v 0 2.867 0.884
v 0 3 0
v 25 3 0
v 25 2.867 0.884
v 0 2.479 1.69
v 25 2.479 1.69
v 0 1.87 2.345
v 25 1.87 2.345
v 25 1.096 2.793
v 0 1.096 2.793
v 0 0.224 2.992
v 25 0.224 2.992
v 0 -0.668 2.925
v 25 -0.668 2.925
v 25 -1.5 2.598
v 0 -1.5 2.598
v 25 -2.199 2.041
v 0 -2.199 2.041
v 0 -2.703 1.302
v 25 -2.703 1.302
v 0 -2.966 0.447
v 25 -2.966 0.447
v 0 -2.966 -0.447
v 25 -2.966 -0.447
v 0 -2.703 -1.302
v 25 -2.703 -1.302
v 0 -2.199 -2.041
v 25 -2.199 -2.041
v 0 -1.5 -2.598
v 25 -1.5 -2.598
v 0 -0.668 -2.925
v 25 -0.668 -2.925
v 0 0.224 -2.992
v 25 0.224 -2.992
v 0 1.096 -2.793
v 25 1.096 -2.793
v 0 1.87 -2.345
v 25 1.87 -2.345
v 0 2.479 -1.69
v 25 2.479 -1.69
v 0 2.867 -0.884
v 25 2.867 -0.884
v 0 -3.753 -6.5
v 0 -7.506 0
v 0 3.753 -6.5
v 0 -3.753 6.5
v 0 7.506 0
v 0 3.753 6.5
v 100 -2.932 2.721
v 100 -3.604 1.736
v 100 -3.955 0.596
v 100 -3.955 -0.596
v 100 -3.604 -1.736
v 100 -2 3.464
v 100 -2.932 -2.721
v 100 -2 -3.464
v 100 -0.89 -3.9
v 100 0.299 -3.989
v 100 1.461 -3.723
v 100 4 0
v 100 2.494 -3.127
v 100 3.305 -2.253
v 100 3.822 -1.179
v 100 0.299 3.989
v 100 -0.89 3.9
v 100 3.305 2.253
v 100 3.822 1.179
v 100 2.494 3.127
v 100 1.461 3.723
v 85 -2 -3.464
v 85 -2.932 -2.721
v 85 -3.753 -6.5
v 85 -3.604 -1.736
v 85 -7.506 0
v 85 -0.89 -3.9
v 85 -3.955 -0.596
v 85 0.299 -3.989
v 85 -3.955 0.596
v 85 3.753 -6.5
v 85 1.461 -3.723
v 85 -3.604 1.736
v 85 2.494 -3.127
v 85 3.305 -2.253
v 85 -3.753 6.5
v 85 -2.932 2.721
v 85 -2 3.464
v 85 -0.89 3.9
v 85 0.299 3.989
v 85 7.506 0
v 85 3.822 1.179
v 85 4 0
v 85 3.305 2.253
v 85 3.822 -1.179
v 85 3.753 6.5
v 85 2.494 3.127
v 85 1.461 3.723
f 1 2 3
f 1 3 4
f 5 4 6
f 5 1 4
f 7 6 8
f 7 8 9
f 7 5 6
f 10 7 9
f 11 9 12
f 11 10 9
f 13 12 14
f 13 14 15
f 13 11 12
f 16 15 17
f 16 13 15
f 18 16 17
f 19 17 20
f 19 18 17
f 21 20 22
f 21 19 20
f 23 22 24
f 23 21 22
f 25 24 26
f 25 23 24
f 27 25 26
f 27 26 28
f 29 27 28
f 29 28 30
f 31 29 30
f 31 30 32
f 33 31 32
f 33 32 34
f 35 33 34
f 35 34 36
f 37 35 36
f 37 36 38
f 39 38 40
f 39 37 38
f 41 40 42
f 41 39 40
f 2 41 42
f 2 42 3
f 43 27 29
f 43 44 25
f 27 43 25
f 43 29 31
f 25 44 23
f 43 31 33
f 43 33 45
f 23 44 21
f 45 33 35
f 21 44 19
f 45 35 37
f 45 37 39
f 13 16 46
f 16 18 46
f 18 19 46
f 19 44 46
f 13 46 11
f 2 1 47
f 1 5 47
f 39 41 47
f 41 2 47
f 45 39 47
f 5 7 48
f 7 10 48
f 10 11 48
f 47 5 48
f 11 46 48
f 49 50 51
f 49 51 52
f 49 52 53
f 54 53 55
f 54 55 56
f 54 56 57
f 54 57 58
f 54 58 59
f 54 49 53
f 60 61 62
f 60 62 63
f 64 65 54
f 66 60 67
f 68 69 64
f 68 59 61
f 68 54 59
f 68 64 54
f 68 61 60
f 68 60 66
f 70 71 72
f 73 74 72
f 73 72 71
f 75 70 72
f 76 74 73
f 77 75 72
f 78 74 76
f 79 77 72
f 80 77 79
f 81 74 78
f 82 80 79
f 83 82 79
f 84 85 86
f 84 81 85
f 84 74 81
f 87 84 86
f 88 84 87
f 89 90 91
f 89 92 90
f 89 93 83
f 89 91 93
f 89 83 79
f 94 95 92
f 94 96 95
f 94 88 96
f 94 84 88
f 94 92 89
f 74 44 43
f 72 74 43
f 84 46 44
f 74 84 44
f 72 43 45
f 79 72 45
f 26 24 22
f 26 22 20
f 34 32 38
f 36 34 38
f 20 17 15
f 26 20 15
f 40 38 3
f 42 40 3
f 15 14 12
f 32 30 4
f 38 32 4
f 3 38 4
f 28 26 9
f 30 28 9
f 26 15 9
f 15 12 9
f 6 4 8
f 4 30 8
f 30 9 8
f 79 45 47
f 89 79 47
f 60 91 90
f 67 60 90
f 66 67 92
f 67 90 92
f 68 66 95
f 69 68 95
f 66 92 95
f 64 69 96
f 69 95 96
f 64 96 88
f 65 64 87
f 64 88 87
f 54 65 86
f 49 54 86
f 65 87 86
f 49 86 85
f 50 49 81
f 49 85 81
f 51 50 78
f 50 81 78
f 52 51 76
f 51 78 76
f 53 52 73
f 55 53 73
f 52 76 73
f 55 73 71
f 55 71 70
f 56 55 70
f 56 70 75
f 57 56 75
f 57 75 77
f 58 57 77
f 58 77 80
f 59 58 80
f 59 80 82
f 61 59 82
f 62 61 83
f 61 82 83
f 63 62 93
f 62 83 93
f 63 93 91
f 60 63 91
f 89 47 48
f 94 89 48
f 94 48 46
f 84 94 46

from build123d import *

# Parameters (mm, degrees)
F0_R     = 4
F0_R_2   = 3
F1_DEPTH = 85
F2_DEPTH = 25
F3_START = 85
F3_DEPTH = 15


# Not quite as in the source:
# - a feature names something its author has since deleted; it is built from what else it names


with BuildPart() as f1:
    # F0 (on Right) → F1 (new body)
    with BuildSketch(Plane.YZ):
        Polygon((-3.7528207105, 6.4999746191), (-7.5055534993, -5.07616e-05), (-3.7527327888, -6.5000253806), (3.7528207105, -6.4999746191), (7.5055534993, 5.07616e-05), (3.7527327888, 6.5000253806), align=None)
        Circle(F0_R, mode=Mode.SUBTRACT)
        Circle(F0_R)
        Circle(F0_R_2, mode=Mode.SUBTRACT)
        Circle(F0_R_2)
    extrude(amount=F1_DEPTH)

    # F0 (on Right) → F2 (cut)
    with BuildSketch(Plane.YZ):
        Circle(F0_R_2)
    extrude(amount=F2_DEPTH, mode=Mode.SUBTRACT)

    # F0 (on Right) → F3 (join)
    with BuildSketch(Plane.YZ.offset(F3_START)):
        Circle(F0_R)
        Circle(F0_R_2, mode=Mode.SUBTRACT)
        Circle(F0_R_2)
    extrude(amount=F3_DEPTH)


solid = f1.part
